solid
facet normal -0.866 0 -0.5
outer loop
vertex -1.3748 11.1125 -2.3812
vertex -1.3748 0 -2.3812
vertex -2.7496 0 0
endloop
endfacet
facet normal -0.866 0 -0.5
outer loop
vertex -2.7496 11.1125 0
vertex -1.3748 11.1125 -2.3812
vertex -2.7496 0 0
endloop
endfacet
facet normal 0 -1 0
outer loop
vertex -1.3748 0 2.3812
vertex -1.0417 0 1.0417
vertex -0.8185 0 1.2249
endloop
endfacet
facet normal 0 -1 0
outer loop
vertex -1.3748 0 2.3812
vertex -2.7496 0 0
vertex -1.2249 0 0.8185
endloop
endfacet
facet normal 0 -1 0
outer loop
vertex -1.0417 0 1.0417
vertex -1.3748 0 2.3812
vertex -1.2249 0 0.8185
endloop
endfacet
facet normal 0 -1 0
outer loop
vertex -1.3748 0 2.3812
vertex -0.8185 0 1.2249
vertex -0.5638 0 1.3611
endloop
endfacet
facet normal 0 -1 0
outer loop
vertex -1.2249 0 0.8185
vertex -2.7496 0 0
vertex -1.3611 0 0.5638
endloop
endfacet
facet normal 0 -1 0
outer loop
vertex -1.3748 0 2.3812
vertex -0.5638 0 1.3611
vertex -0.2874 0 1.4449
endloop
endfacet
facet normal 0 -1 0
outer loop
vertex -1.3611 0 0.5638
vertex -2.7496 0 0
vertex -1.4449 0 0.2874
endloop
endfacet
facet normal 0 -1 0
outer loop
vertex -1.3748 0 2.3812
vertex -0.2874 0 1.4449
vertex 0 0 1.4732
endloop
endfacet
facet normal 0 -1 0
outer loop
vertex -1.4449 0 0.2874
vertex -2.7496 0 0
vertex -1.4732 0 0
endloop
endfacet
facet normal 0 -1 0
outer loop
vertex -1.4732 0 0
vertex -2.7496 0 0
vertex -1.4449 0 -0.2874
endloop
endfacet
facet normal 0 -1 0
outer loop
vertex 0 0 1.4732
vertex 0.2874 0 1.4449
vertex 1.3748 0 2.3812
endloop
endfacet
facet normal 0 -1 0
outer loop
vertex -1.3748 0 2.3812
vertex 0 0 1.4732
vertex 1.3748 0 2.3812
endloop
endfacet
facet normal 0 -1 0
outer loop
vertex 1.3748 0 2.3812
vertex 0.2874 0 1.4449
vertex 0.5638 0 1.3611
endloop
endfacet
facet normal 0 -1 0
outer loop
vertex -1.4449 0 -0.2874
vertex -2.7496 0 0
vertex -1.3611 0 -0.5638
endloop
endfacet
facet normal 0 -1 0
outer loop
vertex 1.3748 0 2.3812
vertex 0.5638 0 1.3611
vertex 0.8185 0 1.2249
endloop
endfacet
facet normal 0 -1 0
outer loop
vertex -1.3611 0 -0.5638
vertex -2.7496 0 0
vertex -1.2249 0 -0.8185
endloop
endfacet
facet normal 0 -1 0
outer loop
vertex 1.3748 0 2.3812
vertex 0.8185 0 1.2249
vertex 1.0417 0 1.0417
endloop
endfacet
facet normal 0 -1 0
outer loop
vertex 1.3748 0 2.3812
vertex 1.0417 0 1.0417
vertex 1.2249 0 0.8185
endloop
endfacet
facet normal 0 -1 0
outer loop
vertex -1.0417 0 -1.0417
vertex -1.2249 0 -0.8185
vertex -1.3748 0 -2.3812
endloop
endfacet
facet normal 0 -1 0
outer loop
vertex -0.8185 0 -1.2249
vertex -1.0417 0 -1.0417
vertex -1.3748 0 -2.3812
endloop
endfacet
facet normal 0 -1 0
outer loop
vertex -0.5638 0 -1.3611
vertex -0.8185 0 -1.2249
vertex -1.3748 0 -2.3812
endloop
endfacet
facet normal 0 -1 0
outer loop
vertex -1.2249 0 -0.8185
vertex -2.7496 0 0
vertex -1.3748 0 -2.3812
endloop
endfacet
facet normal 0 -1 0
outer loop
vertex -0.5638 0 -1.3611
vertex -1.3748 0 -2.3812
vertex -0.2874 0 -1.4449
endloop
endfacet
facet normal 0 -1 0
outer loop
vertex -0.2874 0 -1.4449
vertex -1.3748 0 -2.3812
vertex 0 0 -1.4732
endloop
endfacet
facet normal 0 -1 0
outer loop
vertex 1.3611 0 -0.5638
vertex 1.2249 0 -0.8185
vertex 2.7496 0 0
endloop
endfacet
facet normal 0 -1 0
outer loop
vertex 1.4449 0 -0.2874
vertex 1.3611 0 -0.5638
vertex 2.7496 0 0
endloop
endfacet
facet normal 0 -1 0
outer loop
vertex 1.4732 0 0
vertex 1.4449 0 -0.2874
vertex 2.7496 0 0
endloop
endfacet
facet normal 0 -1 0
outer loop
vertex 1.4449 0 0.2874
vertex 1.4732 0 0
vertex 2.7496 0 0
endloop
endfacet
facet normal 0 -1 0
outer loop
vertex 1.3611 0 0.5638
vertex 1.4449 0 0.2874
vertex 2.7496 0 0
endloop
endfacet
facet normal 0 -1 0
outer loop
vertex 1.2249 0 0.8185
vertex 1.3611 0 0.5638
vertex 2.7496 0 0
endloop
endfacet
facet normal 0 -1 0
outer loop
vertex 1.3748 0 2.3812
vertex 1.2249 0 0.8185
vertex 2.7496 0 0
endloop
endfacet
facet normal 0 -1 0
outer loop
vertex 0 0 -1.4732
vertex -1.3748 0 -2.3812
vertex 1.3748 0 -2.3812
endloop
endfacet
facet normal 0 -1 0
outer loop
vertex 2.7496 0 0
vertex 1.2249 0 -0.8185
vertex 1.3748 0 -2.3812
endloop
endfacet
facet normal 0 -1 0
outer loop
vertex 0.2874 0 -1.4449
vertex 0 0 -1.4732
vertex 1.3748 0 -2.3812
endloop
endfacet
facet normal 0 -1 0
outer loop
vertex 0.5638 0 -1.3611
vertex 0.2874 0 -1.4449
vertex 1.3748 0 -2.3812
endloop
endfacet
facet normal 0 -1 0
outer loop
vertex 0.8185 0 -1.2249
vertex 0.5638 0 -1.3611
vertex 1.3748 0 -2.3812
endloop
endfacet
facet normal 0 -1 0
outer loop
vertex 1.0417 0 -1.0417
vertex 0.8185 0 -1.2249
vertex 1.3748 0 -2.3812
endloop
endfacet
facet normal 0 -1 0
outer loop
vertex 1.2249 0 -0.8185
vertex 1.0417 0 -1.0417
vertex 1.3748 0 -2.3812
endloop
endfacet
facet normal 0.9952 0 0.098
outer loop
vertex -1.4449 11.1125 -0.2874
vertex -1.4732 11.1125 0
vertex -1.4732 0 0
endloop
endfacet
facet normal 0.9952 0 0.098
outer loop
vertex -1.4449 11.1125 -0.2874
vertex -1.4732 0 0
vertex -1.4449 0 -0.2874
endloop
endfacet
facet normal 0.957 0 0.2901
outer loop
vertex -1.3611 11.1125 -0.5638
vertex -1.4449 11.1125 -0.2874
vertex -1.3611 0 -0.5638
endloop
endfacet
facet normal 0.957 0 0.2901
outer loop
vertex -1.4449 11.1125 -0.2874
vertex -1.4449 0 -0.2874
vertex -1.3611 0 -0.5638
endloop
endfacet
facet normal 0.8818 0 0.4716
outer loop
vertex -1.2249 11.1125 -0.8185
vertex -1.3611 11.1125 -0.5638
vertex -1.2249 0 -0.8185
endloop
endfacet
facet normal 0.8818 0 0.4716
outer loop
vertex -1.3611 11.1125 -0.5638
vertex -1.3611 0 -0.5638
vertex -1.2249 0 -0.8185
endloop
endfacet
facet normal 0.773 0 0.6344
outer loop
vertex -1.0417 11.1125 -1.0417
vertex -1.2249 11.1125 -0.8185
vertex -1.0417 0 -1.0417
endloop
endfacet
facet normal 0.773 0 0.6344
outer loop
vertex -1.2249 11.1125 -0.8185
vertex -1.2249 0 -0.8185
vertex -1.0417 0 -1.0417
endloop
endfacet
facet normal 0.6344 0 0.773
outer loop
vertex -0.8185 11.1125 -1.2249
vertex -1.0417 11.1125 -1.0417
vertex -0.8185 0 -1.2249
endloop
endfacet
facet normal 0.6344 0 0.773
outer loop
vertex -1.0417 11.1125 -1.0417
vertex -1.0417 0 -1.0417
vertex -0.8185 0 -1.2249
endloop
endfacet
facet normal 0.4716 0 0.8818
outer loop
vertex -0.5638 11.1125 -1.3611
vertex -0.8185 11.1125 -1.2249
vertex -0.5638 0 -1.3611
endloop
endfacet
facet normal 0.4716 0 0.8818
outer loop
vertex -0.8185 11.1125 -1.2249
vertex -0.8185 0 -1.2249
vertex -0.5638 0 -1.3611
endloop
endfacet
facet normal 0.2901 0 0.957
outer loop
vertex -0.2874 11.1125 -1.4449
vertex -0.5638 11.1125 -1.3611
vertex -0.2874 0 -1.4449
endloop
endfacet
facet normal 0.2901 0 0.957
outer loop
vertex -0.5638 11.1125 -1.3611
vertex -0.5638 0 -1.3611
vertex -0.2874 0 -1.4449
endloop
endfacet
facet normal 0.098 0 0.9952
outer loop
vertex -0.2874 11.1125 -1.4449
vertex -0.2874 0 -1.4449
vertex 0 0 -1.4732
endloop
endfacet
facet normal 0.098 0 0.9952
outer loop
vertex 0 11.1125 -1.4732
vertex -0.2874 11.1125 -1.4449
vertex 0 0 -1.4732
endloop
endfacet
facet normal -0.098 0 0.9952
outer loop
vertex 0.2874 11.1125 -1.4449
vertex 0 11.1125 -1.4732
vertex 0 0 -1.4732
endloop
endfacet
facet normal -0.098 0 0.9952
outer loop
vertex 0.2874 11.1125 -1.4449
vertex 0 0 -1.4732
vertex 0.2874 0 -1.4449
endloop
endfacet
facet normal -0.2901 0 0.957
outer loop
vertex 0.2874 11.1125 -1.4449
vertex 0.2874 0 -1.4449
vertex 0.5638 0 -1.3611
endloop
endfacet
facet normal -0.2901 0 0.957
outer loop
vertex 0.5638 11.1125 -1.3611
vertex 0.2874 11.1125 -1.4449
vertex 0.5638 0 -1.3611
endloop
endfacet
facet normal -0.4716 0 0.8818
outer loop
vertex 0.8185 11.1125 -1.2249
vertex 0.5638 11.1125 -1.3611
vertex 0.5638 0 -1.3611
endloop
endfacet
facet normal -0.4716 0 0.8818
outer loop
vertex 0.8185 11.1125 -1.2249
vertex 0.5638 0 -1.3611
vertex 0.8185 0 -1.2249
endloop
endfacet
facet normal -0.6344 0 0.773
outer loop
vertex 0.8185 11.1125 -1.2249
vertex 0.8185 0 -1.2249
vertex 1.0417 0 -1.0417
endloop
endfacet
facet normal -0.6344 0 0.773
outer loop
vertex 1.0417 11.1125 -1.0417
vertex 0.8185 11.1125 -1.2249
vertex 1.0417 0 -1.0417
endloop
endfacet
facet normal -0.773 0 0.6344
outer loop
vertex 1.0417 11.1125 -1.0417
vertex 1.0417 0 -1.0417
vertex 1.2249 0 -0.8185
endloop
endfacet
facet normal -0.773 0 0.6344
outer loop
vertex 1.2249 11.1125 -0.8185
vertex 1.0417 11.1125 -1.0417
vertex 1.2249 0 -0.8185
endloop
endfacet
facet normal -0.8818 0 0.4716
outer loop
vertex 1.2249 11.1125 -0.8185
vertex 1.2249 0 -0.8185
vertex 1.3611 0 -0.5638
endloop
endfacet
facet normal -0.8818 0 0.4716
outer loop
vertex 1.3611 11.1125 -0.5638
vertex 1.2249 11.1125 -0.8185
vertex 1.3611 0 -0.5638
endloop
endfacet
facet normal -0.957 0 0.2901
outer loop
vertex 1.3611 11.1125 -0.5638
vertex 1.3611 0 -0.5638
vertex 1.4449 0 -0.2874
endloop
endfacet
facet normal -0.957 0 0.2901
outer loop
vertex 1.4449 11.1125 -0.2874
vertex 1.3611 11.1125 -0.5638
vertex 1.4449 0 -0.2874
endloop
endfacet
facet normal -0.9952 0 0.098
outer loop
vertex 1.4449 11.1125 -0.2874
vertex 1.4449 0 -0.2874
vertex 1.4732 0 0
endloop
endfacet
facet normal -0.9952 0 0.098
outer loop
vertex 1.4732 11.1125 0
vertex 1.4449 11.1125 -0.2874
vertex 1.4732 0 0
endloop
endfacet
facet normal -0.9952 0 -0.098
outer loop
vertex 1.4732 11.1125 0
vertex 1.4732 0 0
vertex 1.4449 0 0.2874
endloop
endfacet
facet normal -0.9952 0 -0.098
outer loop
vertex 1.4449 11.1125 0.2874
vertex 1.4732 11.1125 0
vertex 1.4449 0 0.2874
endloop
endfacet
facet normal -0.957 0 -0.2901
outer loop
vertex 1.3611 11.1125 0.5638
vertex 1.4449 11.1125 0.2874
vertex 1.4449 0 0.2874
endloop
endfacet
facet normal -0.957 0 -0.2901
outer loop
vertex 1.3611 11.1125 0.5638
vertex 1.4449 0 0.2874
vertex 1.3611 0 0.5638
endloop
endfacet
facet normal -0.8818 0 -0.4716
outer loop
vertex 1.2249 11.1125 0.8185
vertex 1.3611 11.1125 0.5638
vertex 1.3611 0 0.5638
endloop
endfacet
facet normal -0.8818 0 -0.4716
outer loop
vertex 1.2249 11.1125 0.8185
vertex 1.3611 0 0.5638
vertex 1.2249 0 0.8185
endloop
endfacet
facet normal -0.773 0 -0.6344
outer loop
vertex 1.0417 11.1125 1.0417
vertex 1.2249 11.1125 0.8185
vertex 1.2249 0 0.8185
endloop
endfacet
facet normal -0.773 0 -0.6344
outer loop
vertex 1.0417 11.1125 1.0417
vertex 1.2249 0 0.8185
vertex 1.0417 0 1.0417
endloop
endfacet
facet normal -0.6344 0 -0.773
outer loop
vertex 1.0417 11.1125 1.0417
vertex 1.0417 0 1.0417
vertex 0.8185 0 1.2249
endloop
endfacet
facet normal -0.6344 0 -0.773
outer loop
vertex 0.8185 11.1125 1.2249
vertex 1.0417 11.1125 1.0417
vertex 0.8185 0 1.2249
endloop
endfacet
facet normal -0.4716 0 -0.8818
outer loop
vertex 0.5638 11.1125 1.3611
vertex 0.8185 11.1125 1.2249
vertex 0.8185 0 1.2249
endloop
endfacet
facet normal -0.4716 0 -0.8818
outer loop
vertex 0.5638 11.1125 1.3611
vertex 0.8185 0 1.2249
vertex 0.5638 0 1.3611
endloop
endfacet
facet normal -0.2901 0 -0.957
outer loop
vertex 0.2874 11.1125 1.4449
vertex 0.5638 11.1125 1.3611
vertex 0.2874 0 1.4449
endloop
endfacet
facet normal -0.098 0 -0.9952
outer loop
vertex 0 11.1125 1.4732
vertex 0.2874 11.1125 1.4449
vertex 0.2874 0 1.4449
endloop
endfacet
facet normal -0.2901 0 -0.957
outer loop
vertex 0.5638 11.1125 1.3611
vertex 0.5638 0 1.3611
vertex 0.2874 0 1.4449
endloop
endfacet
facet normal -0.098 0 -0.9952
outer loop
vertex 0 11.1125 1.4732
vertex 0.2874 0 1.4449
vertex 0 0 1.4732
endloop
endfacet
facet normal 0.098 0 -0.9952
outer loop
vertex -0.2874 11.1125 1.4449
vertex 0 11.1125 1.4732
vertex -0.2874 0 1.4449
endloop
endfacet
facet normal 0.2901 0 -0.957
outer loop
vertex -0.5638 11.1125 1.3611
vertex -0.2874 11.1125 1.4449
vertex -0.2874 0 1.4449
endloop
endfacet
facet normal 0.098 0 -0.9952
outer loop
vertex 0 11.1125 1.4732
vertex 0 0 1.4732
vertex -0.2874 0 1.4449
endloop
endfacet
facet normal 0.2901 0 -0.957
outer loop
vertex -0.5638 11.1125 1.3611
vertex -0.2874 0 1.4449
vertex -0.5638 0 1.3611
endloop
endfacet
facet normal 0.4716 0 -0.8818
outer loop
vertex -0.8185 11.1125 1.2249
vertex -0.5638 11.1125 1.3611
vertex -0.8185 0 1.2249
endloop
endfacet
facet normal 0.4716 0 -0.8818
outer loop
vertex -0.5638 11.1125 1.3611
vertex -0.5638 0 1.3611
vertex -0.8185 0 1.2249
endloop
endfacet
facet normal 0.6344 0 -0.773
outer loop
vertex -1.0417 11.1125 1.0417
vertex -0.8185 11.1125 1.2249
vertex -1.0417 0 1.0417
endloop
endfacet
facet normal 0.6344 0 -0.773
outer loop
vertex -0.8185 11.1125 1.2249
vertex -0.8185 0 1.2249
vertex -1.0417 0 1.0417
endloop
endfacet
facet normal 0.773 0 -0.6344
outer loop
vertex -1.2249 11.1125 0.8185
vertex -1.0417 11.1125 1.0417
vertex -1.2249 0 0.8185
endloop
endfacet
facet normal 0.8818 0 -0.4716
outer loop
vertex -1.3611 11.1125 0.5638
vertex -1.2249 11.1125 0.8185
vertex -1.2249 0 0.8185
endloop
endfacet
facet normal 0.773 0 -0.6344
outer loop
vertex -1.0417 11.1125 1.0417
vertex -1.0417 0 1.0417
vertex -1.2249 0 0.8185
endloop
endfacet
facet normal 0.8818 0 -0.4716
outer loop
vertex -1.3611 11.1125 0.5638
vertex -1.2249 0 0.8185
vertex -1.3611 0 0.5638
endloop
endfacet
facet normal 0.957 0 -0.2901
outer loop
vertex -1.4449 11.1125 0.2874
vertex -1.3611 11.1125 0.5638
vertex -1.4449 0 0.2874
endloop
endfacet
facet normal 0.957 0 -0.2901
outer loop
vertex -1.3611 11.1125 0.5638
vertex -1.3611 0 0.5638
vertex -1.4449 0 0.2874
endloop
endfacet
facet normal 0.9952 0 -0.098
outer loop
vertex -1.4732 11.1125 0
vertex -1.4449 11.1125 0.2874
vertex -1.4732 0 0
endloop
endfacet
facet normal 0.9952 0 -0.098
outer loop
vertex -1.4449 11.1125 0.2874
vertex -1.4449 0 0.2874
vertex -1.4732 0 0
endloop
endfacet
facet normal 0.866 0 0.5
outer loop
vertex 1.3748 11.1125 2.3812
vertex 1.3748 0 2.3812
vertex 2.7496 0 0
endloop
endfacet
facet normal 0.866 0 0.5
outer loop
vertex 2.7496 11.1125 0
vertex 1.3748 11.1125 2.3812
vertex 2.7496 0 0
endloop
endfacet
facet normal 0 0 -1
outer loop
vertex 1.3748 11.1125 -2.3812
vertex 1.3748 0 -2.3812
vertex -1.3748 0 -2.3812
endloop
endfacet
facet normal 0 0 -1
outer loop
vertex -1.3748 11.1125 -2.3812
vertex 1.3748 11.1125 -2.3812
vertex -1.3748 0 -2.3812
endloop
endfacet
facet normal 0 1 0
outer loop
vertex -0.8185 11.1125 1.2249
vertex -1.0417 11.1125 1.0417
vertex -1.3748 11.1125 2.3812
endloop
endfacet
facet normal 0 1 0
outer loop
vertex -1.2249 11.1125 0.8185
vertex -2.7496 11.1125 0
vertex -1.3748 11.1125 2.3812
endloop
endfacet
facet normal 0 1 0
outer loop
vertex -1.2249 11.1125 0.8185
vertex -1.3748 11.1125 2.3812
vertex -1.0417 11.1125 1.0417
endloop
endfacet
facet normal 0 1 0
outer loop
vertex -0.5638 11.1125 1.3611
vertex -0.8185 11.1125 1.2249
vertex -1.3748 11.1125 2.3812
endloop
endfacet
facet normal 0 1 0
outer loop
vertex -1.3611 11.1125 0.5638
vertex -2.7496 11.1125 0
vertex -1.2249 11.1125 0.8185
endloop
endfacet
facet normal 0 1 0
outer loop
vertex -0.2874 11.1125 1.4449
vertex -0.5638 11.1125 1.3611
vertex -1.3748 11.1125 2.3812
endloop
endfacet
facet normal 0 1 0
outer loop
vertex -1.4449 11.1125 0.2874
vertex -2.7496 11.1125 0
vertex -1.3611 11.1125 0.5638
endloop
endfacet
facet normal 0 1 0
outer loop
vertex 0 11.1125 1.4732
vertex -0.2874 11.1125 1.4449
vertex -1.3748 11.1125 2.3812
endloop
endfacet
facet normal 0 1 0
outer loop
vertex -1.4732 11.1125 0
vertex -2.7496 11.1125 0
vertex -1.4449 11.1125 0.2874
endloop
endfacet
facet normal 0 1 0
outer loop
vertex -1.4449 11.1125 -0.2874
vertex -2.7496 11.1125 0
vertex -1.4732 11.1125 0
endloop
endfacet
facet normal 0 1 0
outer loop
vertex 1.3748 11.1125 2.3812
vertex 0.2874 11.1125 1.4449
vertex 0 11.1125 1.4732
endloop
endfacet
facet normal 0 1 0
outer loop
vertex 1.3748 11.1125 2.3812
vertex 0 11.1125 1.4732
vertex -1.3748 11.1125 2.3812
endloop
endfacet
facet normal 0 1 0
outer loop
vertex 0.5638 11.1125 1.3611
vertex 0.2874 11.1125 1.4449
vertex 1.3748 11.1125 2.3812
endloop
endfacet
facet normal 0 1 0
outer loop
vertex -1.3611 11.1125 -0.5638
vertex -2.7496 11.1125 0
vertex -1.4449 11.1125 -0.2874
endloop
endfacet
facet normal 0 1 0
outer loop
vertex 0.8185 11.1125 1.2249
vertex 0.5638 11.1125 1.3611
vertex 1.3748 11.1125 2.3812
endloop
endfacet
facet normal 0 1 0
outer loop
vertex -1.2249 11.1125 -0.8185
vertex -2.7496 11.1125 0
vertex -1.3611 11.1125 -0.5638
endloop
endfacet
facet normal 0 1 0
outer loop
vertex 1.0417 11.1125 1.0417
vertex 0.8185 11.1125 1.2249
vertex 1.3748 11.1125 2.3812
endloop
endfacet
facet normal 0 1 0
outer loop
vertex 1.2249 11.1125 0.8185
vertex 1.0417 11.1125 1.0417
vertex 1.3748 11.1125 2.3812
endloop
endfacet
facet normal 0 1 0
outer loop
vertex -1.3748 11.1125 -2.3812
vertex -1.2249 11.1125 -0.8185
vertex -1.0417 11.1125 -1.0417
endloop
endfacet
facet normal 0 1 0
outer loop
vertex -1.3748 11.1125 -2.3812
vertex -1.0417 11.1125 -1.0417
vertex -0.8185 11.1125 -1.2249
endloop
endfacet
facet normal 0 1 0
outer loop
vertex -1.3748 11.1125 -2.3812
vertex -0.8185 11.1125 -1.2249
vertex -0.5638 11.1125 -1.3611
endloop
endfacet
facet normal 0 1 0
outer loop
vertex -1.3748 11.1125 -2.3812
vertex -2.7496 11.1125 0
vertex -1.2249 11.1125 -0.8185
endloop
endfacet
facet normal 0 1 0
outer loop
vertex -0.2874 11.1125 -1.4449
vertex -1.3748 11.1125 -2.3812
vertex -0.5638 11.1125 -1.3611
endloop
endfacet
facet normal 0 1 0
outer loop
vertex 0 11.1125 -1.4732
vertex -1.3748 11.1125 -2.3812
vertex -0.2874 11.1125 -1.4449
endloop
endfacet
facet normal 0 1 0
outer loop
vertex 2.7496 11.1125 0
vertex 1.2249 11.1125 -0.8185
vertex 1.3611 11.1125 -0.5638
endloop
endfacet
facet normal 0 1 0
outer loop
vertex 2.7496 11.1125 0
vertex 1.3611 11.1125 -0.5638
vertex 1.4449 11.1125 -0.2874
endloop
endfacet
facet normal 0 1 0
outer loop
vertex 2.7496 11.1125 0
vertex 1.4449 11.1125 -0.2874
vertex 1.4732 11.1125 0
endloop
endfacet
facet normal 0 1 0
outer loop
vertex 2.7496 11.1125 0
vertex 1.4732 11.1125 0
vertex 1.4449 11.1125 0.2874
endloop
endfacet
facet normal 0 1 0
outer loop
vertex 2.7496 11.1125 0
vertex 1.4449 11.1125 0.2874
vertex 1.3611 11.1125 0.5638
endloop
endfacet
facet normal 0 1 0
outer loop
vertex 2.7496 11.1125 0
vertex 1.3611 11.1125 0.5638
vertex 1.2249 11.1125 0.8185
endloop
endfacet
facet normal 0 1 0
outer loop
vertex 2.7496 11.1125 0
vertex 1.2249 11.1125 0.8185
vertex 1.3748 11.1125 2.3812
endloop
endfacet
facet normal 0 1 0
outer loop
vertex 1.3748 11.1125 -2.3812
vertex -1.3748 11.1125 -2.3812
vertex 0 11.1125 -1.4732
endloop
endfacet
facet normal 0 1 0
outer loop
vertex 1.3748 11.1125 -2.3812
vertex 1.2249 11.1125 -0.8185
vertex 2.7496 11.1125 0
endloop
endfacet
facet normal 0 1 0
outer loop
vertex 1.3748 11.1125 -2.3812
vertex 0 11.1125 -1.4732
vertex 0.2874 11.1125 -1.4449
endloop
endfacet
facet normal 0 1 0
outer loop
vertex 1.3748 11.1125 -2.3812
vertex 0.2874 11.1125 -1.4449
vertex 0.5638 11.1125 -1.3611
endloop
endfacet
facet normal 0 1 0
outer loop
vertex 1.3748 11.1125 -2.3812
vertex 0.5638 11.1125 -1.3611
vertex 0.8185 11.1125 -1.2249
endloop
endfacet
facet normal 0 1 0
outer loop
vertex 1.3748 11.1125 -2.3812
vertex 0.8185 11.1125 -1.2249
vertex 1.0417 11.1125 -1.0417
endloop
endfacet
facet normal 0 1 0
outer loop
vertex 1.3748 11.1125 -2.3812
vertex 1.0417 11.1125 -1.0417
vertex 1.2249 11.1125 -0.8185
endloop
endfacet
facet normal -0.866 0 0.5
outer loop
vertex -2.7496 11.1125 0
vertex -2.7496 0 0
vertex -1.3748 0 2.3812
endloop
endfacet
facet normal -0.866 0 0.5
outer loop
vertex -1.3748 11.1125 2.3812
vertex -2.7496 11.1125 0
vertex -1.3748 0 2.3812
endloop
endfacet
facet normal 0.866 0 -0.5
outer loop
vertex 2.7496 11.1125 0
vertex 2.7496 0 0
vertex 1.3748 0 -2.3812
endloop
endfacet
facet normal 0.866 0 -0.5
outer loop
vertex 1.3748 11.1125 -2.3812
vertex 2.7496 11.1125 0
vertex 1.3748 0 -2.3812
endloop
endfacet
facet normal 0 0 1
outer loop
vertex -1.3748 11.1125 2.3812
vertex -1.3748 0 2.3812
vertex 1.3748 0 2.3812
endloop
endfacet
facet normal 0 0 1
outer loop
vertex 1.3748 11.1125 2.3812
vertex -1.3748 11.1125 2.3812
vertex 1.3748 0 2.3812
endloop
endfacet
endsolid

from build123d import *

# Parameters (mm, degrees)
BOSS_EXTRUDE1_DEPTH              = 11.1125
F_97_0_0059_DIAMETER_HOLE1_D     = 2.9464
F_97_0_0059_DIAMETER_HOLE1_DEPTH = 25.4
F_97_0_0059_DIAMETER_HOLE1_TIP   = 0.885187864


with BuildPart() as part:
    # Sketch1 → Boss-Extrude1 (new body)
    with BuildSketch(Plane(origin=(0, 0, 0), x_dir=(1, 0, 0), z_dir=(0, 1, 0))):
        Polygon((2.749630657, 0), (1.374815329, 2.38125), (-1.374815329, 2.38125), (-2.749630657, 0), (-1.374815329, -2.38125), (1.374815329, -2.38125), align=None)
    extrude(amount=BOSS_EXTRUDE1_DEPTH)

    # #97 (0.0059) Diameter Hole1
    with Locations(Plane(origin=(0, 11.1125, 0), x_dir=(1, 0, 0), z_dir=(0, 1, 0))):
        with Locations((0, 0)):
            Hole(F_97_0_0059_DIAMETER_HOLE1_D / 2, depth=F_97_0_0059_DIAMETER_HOLE1_DEPTH)
            with Locations((0, 0, -(F_97_0_0059_DIAMETER_HOLE1_DEPTH + F_97_0_0059_DIAMETER_HOLE1_TIP / 2))):  # 118° drill point
                Cone(0, F_97_0_0059_DIAMETER_HOLE1_D / 2, F_97_0_0059_DIAMETER_HOLE1_TIP, mode=Mode.SUBTRACT)


solid = part.part
